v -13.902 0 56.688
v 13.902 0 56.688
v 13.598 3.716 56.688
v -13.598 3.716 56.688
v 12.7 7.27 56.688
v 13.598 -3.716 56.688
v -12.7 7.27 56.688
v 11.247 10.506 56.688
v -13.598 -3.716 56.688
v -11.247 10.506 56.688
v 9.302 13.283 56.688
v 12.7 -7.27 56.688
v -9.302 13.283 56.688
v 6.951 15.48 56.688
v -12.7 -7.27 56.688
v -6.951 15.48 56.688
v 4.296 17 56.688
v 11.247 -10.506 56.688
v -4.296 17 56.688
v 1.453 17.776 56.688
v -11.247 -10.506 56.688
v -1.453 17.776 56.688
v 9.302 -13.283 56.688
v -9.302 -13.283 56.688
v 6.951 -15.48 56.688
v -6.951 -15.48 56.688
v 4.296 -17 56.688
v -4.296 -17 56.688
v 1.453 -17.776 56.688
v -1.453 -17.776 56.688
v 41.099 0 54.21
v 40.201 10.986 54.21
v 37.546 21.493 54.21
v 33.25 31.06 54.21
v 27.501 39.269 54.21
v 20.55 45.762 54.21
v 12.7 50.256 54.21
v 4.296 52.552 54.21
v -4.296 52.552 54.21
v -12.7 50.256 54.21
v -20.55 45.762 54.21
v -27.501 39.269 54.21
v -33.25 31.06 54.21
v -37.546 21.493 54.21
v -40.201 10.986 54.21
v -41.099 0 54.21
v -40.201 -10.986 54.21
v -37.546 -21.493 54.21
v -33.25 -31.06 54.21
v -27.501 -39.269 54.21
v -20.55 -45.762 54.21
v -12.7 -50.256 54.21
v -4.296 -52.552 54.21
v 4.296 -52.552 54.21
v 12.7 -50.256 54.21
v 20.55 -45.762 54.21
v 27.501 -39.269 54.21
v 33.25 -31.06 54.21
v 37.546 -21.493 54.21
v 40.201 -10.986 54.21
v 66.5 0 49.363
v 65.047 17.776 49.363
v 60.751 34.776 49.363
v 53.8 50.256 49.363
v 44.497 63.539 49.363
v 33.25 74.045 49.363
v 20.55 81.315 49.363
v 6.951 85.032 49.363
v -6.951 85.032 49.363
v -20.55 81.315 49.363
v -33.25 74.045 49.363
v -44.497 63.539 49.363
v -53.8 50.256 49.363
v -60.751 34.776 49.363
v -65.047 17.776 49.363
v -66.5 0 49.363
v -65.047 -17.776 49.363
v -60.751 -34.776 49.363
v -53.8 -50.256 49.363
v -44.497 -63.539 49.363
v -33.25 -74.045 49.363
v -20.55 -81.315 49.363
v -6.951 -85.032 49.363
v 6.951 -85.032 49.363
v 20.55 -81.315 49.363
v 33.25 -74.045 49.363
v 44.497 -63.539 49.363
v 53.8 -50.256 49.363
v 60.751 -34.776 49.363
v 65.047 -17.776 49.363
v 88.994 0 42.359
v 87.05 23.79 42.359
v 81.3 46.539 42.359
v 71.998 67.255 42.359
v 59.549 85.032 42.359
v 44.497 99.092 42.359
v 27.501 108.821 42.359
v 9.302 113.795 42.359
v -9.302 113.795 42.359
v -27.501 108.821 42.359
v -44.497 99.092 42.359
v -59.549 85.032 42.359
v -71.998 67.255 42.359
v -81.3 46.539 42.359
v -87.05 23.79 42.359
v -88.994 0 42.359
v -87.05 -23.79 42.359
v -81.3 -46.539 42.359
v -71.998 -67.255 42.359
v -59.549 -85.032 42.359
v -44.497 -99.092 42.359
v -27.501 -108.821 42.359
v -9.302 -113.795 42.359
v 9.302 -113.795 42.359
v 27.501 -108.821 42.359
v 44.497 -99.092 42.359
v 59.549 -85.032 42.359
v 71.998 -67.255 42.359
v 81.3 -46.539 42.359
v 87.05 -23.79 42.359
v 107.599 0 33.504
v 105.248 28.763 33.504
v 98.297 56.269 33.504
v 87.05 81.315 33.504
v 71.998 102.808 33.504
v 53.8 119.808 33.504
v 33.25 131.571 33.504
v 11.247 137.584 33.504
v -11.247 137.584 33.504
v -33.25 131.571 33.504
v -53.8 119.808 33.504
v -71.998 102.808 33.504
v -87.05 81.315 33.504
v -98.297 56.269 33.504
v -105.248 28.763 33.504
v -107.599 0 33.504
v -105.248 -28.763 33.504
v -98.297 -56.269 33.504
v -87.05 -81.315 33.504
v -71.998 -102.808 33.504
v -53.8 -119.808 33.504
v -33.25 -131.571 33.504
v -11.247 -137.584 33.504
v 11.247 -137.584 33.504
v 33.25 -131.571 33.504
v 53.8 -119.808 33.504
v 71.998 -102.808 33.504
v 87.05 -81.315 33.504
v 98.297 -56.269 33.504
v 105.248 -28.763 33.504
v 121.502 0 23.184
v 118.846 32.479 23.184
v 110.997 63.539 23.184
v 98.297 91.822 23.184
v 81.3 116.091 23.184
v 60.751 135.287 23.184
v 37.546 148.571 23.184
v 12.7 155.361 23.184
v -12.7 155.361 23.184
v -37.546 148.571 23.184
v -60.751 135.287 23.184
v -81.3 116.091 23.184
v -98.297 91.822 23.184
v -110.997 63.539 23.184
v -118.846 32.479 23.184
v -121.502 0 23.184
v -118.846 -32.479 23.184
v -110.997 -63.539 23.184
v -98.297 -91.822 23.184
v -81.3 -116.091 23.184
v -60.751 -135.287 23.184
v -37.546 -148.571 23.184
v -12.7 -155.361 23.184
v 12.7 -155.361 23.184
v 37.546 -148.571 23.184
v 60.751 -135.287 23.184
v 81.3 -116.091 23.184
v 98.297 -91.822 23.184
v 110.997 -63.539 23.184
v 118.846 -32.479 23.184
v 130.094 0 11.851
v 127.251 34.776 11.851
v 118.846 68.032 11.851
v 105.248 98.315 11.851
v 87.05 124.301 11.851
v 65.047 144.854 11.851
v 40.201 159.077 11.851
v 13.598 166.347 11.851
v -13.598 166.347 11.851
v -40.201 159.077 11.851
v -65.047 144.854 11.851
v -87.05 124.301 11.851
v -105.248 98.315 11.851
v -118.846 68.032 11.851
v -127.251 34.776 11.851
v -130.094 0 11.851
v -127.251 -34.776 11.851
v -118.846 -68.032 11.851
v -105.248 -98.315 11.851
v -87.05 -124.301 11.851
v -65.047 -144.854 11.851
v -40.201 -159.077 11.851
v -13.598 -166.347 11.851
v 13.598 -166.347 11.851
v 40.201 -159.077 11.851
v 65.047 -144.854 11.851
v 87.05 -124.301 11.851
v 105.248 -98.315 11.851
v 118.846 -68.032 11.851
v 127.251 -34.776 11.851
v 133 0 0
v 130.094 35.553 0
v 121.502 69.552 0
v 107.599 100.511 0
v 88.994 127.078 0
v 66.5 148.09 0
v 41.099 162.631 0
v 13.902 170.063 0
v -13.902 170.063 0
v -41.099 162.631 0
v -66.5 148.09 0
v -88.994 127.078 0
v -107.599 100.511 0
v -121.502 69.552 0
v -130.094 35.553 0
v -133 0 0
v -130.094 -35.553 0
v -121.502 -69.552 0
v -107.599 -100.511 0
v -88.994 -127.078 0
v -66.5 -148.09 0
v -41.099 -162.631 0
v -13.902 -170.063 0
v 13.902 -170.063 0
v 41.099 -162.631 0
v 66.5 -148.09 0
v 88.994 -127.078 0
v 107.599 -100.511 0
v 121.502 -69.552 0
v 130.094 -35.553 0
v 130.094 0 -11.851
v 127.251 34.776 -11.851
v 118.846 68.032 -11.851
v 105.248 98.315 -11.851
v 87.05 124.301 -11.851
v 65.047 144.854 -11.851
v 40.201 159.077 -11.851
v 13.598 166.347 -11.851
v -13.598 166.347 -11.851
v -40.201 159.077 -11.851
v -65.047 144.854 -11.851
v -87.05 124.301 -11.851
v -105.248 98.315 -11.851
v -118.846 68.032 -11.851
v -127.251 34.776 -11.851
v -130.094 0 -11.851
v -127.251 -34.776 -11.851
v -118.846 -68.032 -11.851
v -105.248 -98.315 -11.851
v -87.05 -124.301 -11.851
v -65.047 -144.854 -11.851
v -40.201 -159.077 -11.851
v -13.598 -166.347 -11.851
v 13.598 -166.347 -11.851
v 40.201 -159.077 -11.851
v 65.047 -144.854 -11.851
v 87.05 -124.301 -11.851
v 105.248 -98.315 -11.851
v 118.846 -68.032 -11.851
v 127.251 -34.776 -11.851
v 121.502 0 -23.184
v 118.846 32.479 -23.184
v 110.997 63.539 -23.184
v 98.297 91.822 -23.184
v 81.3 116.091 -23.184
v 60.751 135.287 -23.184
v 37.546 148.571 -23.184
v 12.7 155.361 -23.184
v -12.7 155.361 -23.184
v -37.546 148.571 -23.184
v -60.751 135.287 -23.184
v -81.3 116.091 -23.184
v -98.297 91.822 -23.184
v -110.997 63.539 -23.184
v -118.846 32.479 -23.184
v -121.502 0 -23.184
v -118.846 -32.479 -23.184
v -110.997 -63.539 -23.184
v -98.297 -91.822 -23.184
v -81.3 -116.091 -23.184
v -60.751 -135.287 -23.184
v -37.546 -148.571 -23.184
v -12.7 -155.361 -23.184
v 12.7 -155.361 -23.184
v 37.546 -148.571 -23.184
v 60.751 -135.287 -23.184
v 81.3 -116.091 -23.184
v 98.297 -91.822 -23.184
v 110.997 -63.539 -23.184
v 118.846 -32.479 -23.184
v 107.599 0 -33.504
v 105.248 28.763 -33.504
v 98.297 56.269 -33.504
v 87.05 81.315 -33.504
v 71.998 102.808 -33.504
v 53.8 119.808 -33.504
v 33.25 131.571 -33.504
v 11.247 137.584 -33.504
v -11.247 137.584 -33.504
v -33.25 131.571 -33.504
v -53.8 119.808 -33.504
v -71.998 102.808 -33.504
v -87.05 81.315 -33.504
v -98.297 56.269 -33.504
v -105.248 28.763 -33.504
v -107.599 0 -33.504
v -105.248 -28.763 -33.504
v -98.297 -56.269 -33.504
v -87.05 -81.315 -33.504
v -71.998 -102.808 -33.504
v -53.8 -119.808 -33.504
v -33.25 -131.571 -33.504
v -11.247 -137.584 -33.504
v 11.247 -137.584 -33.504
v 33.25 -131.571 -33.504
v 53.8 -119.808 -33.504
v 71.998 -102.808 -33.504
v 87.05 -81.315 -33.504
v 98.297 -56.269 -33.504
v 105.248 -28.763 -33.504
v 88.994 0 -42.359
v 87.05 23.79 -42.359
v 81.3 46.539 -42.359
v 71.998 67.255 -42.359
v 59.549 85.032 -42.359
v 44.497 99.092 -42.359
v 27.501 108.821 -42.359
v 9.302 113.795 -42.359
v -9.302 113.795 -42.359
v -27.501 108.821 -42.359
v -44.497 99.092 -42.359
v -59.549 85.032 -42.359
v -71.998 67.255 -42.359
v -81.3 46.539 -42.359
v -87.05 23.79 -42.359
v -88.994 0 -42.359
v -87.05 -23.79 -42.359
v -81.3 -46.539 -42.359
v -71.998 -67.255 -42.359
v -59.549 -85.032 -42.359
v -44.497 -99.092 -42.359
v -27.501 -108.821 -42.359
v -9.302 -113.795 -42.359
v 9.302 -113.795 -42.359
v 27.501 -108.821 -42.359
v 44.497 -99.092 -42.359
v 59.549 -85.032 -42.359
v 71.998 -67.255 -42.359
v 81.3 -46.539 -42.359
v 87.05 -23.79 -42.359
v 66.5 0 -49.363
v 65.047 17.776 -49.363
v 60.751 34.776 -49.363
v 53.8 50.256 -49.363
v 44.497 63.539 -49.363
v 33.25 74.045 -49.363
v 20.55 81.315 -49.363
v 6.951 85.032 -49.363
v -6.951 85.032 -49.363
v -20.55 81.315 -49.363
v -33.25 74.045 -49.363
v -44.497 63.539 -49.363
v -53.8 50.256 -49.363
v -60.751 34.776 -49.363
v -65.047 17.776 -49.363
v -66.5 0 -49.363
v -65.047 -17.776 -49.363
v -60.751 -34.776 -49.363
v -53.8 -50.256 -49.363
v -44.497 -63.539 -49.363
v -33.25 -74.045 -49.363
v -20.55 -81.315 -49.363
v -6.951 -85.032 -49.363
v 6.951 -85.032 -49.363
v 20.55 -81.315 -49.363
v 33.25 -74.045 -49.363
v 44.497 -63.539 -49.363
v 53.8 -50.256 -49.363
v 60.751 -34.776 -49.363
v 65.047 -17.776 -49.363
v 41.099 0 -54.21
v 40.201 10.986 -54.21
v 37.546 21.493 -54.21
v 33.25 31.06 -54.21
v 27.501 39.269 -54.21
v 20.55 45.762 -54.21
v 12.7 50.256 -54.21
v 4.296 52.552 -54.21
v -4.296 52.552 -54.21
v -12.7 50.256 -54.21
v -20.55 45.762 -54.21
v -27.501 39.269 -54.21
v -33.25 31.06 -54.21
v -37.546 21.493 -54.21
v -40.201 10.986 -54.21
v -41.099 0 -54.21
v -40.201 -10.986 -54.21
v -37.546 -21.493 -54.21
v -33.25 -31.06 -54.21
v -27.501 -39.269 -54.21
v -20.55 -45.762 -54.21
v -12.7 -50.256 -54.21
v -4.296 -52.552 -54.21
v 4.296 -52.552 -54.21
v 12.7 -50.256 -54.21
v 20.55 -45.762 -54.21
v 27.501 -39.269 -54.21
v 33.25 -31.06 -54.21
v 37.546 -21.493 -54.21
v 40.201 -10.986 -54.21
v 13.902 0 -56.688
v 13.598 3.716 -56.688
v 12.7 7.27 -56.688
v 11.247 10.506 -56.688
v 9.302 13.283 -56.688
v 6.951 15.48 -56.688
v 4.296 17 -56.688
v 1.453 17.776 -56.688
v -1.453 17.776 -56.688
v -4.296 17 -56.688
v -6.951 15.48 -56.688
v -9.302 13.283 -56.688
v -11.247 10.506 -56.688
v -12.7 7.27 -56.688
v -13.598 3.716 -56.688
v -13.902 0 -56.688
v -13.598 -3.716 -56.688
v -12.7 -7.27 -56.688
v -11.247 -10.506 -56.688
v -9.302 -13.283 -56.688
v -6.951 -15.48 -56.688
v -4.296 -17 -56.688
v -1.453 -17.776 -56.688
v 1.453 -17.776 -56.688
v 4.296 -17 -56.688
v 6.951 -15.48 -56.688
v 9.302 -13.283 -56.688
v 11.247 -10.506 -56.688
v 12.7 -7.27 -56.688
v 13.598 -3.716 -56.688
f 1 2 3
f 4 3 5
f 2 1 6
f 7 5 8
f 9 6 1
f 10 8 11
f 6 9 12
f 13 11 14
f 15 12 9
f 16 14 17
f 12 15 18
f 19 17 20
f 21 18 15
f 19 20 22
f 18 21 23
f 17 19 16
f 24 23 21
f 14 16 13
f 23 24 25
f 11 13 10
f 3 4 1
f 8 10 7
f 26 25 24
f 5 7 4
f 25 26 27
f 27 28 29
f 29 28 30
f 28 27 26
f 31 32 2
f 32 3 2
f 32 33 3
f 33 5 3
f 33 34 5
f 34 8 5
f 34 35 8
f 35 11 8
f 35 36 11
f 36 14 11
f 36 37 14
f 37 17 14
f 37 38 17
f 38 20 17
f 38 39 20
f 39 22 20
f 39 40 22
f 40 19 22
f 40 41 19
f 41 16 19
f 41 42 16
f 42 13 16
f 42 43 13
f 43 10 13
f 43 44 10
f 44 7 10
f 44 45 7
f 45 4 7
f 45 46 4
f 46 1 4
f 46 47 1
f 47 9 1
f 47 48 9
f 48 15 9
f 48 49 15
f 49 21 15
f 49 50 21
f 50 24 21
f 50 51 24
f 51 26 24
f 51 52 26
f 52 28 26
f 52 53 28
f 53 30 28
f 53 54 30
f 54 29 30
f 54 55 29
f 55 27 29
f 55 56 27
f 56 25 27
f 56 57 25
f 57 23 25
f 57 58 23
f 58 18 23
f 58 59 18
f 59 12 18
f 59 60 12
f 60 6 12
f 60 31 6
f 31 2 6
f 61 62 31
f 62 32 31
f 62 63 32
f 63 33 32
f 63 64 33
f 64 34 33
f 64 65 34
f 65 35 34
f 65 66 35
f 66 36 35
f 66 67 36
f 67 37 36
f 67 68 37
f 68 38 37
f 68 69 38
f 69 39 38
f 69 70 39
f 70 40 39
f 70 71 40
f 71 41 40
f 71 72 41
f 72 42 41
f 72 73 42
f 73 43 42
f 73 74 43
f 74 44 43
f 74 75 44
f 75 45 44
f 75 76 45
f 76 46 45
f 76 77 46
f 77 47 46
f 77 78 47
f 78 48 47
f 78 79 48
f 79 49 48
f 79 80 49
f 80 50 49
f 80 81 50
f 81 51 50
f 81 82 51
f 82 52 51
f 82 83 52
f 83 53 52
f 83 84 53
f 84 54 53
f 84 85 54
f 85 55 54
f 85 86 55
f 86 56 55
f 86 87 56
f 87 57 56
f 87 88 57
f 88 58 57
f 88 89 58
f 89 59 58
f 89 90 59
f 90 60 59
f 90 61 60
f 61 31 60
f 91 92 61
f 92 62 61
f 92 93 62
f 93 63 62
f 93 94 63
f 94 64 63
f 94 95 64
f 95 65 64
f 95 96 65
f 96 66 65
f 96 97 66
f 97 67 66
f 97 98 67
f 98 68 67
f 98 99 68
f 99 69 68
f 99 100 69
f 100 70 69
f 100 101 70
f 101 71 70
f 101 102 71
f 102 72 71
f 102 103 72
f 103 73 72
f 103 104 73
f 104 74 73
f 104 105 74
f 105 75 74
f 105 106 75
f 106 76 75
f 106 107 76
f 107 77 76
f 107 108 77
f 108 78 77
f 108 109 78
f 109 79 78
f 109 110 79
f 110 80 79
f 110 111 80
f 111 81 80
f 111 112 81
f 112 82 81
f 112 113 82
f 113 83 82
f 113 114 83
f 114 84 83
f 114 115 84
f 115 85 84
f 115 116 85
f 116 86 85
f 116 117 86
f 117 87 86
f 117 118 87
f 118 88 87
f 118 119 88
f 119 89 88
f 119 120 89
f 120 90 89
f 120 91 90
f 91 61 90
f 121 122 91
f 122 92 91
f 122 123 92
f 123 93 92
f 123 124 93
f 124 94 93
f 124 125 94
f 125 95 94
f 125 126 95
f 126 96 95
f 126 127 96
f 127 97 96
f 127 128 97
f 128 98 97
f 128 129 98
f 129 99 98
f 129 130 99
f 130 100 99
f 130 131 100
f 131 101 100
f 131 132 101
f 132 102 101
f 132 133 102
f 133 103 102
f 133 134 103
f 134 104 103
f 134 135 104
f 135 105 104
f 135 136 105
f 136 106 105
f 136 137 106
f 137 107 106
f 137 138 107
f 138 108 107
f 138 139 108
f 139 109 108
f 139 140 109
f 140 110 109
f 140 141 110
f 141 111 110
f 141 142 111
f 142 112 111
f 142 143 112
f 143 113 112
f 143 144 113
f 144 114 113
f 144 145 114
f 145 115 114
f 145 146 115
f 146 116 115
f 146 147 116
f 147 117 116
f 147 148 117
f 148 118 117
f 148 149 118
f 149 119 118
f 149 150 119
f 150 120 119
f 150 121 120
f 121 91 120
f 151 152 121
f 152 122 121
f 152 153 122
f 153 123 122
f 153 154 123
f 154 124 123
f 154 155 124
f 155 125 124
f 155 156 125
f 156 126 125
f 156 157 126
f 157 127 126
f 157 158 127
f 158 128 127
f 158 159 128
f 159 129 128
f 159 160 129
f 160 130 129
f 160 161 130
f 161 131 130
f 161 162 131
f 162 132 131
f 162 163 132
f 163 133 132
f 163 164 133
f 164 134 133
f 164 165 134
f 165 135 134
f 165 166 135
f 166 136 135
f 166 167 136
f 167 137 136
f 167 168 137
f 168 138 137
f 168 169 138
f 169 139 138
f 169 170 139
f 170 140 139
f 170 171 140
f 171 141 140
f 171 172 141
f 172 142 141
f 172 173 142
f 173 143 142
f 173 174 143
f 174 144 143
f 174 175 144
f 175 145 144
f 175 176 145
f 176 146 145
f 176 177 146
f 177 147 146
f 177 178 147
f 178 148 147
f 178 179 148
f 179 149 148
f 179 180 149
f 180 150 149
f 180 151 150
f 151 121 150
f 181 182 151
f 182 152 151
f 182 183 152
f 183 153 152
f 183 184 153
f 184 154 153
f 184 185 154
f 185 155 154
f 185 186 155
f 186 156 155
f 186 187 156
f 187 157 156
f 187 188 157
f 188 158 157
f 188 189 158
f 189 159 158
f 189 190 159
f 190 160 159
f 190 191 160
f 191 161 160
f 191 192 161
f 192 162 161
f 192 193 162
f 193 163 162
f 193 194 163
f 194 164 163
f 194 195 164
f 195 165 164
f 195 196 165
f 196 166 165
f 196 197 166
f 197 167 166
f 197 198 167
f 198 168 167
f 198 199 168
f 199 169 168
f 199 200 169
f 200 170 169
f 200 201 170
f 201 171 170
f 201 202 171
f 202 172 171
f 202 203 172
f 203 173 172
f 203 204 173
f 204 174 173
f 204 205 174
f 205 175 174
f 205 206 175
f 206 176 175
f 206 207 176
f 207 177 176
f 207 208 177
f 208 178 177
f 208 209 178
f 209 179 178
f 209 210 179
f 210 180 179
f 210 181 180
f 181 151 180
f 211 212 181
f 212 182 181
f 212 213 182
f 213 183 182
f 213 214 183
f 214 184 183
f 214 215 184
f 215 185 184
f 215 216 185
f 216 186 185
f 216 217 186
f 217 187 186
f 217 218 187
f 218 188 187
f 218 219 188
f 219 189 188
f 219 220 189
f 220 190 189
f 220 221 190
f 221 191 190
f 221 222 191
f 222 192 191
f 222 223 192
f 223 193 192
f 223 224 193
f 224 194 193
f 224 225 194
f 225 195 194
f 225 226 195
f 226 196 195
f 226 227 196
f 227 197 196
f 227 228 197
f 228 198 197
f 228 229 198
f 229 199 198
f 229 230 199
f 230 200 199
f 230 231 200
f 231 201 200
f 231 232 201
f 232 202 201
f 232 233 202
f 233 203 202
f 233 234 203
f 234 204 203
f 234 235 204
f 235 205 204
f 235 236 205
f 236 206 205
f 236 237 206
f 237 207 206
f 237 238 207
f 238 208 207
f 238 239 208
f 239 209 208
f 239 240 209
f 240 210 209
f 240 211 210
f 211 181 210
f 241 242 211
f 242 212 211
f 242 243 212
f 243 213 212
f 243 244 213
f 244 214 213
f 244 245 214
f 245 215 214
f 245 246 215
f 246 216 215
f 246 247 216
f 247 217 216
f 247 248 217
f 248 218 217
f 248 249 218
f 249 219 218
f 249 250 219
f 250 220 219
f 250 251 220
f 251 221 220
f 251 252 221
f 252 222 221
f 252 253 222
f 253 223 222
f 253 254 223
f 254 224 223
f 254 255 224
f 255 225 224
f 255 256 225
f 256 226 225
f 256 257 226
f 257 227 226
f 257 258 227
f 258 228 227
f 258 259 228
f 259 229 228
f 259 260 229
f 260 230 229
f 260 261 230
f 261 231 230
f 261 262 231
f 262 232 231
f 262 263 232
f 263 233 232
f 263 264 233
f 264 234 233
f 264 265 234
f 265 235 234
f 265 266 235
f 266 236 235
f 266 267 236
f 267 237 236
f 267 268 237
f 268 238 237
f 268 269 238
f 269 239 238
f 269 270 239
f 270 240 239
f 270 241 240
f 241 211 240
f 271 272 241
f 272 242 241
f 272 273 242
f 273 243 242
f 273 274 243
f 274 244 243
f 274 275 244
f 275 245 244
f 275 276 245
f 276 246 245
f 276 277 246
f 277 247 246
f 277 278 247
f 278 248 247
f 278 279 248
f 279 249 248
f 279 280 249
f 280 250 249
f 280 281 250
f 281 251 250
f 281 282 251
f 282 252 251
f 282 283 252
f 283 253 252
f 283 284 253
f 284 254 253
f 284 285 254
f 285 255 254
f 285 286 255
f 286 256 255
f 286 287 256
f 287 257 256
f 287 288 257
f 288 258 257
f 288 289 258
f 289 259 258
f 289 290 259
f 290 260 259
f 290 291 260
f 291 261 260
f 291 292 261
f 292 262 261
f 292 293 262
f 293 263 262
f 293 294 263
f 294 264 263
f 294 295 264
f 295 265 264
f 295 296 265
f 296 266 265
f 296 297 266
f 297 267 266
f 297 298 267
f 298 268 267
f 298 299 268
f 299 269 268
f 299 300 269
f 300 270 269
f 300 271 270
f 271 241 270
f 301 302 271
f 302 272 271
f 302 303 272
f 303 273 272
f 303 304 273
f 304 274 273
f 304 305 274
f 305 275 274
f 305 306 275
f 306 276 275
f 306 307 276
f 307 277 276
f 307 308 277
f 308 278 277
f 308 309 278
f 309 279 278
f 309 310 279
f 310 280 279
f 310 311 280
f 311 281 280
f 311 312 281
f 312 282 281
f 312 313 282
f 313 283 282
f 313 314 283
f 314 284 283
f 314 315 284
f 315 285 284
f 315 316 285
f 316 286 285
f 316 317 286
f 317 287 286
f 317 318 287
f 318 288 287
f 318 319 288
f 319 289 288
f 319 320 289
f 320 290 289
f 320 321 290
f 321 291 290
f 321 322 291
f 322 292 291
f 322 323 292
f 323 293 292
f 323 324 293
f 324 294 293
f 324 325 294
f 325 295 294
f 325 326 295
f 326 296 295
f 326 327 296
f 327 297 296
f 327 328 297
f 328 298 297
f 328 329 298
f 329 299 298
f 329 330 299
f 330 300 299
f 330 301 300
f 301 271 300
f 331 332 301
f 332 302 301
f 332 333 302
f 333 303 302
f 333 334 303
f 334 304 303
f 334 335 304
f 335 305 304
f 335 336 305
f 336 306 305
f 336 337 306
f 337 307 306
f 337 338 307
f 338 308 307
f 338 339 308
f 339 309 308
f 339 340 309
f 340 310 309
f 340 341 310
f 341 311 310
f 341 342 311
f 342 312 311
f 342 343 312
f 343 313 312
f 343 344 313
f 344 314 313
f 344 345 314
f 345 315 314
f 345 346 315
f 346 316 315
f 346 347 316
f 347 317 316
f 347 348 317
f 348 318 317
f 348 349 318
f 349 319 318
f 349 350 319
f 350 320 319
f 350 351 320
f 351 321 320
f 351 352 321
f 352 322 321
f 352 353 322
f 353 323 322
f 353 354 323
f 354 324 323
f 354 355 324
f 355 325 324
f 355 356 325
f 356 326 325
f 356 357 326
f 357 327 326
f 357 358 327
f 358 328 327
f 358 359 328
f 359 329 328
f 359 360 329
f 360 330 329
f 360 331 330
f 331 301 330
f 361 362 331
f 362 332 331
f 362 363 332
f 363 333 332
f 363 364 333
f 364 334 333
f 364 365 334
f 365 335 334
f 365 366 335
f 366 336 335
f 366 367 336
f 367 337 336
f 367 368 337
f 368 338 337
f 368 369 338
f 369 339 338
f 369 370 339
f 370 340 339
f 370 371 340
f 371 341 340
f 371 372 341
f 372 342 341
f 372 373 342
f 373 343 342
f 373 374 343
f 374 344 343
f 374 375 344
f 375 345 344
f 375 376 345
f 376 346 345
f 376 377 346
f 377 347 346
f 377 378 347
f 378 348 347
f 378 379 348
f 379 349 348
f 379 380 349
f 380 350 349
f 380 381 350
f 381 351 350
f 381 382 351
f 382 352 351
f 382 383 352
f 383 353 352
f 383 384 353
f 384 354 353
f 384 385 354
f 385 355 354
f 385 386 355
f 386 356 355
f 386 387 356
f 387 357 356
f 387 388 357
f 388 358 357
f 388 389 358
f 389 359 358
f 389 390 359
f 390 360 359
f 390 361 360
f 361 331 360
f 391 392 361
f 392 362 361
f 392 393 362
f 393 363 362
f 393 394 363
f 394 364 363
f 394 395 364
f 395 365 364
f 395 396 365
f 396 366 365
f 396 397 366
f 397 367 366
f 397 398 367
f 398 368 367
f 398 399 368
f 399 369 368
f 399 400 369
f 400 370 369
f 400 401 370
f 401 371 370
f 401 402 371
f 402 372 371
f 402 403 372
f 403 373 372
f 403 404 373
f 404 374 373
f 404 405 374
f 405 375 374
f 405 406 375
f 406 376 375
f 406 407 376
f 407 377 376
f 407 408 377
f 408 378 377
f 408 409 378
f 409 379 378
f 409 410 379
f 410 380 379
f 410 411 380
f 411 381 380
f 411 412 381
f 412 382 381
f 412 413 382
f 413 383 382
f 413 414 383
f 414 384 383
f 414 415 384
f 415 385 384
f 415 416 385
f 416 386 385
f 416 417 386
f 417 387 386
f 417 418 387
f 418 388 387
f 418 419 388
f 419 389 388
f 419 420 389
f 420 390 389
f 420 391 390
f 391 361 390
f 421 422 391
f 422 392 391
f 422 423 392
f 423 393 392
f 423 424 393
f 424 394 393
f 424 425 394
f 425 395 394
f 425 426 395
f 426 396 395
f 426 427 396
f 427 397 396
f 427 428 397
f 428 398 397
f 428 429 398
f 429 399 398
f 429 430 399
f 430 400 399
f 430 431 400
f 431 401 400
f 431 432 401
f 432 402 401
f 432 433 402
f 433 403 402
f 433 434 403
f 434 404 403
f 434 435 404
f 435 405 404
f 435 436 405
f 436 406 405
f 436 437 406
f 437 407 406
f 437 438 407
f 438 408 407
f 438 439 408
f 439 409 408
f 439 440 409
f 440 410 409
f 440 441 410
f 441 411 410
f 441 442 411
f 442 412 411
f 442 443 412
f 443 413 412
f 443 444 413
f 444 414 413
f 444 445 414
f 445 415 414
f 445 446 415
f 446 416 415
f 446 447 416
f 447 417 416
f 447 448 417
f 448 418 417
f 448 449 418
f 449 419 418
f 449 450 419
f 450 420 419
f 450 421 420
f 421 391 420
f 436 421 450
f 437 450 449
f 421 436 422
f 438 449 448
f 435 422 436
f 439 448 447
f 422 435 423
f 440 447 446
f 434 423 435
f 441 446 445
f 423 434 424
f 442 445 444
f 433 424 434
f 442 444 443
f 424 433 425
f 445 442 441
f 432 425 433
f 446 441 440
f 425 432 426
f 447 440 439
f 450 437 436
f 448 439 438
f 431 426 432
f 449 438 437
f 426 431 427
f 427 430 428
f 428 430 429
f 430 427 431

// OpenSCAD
// Generated by SolidPython 1.0.1 on 2020-07-29 00:46:47


scale(v = [7, 9, 3]) {
	sphere(r = 19);
}
/***********************************************
*********      SolidPython code:      **********
************************************************
 
# import packages: SolidPython
from solid import *
from solid.utils import *
from itertools import chain, combinations, permutations


class Resize:

    def __init__(self, scad_file):
        self.scad_file = scad_file
        #self.scad_file = import_scad(scad_file)
        # cone/cylinder param:
        self.r1 = 0
        self.r2 = 0
        self.h = 0
        # rectangular prism param:
        self.w = 0
        self.l = 0
        # ellipse param:
        self.r = 0

    # import OpenScad code (file name corresponds to shape)


    # classify shape + parameters
    def assign(self, param1, param2, param3):
        if self.scad_file == 'cone.scad':
            self.r1 = param1
            self.r2 = param2
            self.h = param3
        elif self.scad_file == 'cylinder.scad':
            self.r1 = param1
            self.r2 = param2
            self.h = param3
        elif self.scad_file == 'rectangularPrism.scad':
            self.h = param1
            self.l = param2
            self.w = param3
        else:
            self.r = param1
            self.h = param2

    # resize parameters
    def iterate(self):
        x = range(3, 20, 2)
        i = 1
        if self.scad_file == 'cone.scad':
            tempList = list(permutations(x, 2))
            for temp in tempList:
                param1 = temp[0]
                param2 = temp[1]
                filepath = 'produced_scad_files/' + 'cone' + str(param1) + '_' + str(param2) + '_' + '.scad'
                scad_render_to_file(cylinder(h=param1, r1=param2, r2=0), filepath)

        elif self.scad_file == 'cylinder.scad':
            tempList = list(permutations(x, 3))
            for temp in tempList:
                param1 = temp[0]
                param2 = temp[1]
                filepath = 'produced_scad_files/' + 'cylinder' + str(param1) + '_' + str(param2) + '_' + '.scad'
                scad_render_to_file(cylinder(h=param1, r1=param2, r2=param2), filepath)

        elif self.scad_file == 'rectangularPrism.scad':
            tempList = list(permutations(x, 3))
            for temp in tempList:
                param1 = temp[0]
                param2 = temp[1]
                param3 = temp[2]
                filepath = 'produced_scad_files/' + 'rectangularPrism' + str(param1) + '_' + str(param2) + '_' + str(
                    param3) + '.scad'
                scad_render_to_file(cube(size=(param1, param2, param3)), filepath)

        elif self.scad_file == 'ellipse.scad':
            tempList = list(permutations(x, 4))
            for temp in tempList:
                param1 = temp[0]
                param2 = temp[1]
                param3 = temp[2]
                param4 = temp[3]
                filepath = 'produced_scad_files/' + 'ellipse' + str(param1) + '_' + str(param2) + '_' + str(param3) + '_' + str(param4) + '.scad'
                scad_render_to_file(scale([param1, param2, param3])(sphere(r=param4)), filepath)

    def render_to_scadfile(self):
        scad_render_to_file(scad, 'example.scad') 
 
************************************************/
